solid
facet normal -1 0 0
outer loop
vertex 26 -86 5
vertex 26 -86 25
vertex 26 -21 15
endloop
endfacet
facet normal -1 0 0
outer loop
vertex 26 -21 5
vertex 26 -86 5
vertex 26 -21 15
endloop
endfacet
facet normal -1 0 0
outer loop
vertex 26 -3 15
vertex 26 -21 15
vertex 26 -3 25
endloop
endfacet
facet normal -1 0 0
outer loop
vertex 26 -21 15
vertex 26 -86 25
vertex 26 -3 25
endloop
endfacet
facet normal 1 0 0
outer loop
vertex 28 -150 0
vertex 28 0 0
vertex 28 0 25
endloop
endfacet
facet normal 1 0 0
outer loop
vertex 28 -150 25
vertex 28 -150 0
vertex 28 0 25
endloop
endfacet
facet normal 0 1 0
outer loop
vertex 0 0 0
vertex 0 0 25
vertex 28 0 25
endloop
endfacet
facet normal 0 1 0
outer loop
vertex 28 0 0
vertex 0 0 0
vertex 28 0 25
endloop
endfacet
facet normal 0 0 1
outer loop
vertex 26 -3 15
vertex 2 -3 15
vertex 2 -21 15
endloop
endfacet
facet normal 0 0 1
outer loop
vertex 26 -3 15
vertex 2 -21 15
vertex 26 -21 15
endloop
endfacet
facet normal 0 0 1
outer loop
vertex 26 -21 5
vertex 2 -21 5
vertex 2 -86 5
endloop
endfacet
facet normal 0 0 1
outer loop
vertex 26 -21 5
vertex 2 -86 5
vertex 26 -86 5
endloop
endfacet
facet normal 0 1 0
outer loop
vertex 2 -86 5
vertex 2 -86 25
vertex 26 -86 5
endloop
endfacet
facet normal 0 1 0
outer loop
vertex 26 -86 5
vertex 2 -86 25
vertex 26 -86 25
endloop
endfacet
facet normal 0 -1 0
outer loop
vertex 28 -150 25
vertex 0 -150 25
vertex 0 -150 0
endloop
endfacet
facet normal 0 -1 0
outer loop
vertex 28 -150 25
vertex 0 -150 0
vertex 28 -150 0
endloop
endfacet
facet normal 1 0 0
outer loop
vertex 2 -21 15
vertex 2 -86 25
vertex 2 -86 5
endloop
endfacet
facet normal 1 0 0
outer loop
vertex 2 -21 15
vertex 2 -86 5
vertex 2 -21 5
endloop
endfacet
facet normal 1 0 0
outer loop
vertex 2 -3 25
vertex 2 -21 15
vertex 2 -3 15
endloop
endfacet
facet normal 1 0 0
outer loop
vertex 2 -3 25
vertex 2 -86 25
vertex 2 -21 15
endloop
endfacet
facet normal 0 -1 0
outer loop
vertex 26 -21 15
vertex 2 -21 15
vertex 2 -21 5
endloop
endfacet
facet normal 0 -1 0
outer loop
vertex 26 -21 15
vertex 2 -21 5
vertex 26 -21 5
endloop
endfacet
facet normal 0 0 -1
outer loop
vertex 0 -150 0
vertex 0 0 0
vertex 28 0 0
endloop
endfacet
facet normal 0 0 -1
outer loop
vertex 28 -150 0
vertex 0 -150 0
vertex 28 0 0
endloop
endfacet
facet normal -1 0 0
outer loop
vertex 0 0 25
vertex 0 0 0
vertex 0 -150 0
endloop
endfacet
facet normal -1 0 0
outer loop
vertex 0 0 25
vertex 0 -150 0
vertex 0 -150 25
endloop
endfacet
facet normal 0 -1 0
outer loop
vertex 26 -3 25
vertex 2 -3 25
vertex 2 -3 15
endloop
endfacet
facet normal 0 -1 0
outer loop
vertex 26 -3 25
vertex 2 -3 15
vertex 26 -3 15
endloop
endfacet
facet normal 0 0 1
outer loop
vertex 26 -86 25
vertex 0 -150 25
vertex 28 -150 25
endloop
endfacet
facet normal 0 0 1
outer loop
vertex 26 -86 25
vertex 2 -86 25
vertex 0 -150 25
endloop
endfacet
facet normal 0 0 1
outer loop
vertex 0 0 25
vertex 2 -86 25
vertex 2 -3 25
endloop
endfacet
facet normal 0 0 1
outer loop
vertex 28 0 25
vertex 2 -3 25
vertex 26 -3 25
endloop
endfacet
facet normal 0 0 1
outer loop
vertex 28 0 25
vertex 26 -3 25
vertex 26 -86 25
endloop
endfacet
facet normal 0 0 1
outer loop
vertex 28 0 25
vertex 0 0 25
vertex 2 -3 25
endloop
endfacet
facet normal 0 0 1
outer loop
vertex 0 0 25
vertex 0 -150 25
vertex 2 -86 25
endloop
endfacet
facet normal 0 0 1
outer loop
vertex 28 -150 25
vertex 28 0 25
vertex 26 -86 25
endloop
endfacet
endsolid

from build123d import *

# Parameters (mm, degrees)
F0_W     = 28
F0_H     = 25
F1_DEPTH = 150
F2_W     = 24
F2_H     = 18
F3_DEPTH = 10
F4_W     = 24
F4_H     = 65
F5_DEPTH = 20


with BuildPart() as f1:
    # F0 (on Front) → F1 (new body)
    with BuildSketch(Plane.XZ):
        with Locations((14, 12.5)):
            Rectangle(F0_W, F0_H)
    extrude(amount=F1_DEPTH)

    # F2 (on face) → F3 (cut)
    with BuildSketch(Plane.XY.offset(25)):
        with Locations((14, -12)):
            Rectangle(F2_W, F2_H)
    extrude(amount=-F3_DEPTH, mode=Mode.SUBTRACT)

    # F4 (on face) → F5 (cut)
    with BuildSketch(Plane.XY.offset(25)):
        with Locations((14, -53.5)):
            Rectangle(F4_W, F4_H)
    extrude(amount=-F5_DEPTH, mode=Mode.SUBTRACT)


solid = f1.part
